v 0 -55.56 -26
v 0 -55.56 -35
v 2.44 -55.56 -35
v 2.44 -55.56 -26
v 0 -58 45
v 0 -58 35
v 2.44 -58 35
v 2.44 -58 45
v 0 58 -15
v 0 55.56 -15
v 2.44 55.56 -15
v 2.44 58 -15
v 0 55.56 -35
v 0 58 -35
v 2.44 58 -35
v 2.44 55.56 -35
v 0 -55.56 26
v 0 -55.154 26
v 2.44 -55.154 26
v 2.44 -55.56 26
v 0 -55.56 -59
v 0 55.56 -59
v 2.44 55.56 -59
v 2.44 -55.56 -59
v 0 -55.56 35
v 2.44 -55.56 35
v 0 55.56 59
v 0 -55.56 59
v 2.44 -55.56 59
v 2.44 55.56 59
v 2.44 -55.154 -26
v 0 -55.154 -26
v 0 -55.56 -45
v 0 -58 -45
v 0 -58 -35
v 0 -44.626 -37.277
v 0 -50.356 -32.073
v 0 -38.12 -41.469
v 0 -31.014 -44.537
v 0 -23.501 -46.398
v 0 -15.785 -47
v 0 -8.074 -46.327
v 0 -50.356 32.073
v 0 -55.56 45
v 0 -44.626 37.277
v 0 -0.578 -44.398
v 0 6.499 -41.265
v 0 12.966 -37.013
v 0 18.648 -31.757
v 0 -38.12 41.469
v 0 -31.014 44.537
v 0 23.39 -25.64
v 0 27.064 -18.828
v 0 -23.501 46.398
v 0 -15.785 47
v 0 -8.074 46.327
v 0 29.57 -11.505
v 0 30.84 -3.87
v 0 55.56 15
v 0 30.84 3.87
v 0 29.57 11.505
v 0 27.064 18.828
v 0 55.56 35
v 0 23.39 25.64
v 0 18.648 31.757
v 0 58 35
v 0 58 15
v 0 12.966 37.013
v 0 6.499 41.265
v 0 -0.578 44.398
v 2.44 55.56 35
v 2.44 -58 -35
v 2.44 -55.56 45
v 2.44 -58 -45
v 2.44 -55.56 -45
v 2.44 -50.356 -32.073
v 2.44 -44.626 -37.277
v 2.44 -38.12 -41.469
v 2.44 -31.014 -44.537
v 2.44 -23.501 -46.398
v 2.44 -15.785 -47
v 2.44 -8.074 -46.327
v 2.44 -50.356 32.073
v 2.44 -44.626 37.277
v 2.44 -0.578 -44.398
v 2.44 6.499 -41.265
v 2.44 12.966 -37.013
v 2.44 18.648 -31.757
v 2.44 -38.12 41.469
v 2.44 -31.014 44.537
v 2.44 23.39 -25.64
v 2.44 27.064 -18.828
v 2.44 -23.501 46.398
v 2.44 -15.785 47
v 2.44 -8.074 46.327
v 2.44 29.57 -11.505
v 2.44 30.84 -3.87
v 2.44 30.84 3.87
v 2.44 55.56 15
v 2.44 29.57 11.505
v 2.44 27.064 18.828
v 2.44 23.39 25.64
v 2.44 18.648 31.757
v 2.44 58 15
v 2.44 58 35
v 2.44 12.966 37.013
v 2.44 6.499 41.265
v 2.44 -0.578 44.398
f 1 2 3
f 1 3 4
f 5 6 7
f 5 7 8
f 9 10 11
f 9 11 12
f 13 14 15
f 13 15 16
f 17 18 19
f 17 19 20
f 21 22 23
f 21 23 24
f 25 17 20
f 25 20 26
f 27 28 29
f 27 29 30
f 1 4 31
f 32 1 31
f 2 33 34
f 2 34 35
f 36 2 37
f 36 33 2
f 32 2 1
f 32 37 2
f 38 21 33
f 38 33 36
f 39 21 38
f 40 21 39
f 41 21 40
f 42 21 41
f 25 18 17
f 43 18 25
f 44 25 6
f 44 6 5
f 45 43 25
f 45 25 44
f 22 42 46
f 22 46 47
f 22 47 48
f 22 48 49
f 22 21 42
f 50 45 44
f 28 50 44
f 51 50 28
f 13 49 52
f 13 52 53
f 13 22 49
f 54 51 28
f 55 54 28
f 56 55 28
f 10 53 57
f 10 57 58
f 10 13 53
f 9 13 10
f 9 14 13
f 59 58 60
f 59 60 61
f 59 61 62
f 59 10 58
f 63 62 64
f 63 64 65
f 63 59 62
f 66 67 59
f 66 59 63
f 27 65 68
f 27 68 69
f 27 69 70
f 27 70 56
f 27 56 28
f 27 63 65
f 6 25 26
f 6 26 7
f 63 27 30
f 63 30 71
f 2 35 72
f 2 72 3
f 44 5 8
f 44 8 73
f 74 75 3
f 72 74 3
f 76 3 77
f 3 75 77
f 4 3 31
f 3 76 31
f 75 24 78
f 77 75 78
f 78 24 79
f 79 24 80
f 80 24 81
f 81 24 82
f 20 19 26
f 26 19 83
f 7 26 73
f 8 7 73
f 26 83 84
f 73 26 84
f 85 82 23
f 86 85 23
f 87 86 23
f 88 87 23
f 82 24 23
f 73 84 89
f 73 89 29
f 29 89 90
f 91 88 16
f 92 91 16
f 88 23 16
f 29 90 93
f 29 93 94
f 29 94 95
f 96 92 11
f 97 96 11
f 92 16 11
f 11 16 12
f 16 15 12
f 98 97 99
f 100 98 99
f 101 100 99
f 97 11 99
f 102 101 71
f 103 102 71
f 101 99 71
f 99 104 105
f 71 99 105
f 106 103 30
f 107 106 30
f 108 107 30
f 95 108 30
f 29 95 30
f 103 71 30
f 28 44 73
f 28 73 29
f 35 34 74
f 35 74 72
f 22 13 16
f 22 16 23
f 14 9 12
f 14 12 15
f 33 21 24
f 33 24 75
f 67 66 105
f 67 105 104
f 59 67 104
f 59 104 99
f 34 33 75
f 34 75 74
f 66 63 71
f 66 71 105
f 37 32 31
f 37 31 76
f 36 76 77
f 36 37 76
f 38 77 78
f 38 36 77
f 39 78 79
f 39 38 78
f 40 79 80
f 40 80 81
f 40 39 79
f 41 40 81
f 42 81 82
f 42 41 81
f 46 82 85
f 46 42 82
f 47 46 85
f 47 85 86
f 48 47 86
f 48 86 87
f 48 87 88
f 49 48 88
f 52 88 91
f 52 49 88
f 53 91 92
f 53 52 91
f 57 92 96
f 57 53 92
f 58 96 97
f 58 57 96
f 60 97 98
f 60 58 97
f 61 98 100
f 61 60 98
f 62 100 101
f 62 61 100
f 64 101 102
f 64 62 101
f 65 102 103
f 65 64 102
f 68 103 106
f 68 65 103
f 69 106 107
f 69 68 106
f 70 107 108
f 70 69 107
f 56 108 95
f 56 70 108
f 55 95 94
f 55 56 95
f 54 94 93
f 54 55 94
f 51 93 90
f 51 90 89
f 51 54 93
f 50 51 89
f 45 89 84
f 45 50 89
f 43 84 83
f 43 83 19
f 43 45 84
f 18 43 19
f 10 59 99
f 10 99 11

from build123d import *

# Parameters (mm, degrees)
SALIENTE_EXTRUIR1_DEPTH = 2.44


with BuildPart() as part:
    # Croquis1 → Saliente-Extruir1 (new body)
    with BuildSketch(Plane(origin=(0, 0, 0), x_dir=(0, 0, -1), z_dir=(1, 0, 0))):
        with BuildLine():
            Line((26, -55.56), (26, -55.153543901))
            ThreePointArc((26, -55.153543901), (0, 31), (-26, -55.153543901))
            Line((-26, -55.153543901), (-26, -55.56))
            Line((-26, -55.56), (-35, -55.56))
            Line((-35, -55.56), (-35, -58))
            Line((-35, -58), (-45, -58))
            Line((-45, -58), (-45, -55.56))
            Line((-45, -55.56), (-59, -55.56))
            Line((-59, -55.56), (-59, 55.56))
            Line((-59, 55.56), (-35, 55.56))
            Line((-35, 55.56), (-35, 58))
            Line((-35, 58), (-15, 58))
            Line((-15, 58), (-15, 55.56))
            Line((-15, 55.56), (15, 55.56))
            Line((15, 55.56), (15, 58))
            Line((15, 58), (35, 58))
            Line((35, 58), (35, 55.56))
            Line((35, 55.56), (59, 55.56))
            Line((59, 55.56), (59, -55.56))
            Line((59, -55.56), (45, -55.56))
            Line((45, -55.56), (45, -58))
            Line((45, -58), (35, -58))
            Line((35, -58), (35, -55.56))
            Line((35, -55.56), (26, -55.56))
        make_face()
    extrude(amount=SALIENTE_EXTRUIR1_DEPTH)


solid = part.part
